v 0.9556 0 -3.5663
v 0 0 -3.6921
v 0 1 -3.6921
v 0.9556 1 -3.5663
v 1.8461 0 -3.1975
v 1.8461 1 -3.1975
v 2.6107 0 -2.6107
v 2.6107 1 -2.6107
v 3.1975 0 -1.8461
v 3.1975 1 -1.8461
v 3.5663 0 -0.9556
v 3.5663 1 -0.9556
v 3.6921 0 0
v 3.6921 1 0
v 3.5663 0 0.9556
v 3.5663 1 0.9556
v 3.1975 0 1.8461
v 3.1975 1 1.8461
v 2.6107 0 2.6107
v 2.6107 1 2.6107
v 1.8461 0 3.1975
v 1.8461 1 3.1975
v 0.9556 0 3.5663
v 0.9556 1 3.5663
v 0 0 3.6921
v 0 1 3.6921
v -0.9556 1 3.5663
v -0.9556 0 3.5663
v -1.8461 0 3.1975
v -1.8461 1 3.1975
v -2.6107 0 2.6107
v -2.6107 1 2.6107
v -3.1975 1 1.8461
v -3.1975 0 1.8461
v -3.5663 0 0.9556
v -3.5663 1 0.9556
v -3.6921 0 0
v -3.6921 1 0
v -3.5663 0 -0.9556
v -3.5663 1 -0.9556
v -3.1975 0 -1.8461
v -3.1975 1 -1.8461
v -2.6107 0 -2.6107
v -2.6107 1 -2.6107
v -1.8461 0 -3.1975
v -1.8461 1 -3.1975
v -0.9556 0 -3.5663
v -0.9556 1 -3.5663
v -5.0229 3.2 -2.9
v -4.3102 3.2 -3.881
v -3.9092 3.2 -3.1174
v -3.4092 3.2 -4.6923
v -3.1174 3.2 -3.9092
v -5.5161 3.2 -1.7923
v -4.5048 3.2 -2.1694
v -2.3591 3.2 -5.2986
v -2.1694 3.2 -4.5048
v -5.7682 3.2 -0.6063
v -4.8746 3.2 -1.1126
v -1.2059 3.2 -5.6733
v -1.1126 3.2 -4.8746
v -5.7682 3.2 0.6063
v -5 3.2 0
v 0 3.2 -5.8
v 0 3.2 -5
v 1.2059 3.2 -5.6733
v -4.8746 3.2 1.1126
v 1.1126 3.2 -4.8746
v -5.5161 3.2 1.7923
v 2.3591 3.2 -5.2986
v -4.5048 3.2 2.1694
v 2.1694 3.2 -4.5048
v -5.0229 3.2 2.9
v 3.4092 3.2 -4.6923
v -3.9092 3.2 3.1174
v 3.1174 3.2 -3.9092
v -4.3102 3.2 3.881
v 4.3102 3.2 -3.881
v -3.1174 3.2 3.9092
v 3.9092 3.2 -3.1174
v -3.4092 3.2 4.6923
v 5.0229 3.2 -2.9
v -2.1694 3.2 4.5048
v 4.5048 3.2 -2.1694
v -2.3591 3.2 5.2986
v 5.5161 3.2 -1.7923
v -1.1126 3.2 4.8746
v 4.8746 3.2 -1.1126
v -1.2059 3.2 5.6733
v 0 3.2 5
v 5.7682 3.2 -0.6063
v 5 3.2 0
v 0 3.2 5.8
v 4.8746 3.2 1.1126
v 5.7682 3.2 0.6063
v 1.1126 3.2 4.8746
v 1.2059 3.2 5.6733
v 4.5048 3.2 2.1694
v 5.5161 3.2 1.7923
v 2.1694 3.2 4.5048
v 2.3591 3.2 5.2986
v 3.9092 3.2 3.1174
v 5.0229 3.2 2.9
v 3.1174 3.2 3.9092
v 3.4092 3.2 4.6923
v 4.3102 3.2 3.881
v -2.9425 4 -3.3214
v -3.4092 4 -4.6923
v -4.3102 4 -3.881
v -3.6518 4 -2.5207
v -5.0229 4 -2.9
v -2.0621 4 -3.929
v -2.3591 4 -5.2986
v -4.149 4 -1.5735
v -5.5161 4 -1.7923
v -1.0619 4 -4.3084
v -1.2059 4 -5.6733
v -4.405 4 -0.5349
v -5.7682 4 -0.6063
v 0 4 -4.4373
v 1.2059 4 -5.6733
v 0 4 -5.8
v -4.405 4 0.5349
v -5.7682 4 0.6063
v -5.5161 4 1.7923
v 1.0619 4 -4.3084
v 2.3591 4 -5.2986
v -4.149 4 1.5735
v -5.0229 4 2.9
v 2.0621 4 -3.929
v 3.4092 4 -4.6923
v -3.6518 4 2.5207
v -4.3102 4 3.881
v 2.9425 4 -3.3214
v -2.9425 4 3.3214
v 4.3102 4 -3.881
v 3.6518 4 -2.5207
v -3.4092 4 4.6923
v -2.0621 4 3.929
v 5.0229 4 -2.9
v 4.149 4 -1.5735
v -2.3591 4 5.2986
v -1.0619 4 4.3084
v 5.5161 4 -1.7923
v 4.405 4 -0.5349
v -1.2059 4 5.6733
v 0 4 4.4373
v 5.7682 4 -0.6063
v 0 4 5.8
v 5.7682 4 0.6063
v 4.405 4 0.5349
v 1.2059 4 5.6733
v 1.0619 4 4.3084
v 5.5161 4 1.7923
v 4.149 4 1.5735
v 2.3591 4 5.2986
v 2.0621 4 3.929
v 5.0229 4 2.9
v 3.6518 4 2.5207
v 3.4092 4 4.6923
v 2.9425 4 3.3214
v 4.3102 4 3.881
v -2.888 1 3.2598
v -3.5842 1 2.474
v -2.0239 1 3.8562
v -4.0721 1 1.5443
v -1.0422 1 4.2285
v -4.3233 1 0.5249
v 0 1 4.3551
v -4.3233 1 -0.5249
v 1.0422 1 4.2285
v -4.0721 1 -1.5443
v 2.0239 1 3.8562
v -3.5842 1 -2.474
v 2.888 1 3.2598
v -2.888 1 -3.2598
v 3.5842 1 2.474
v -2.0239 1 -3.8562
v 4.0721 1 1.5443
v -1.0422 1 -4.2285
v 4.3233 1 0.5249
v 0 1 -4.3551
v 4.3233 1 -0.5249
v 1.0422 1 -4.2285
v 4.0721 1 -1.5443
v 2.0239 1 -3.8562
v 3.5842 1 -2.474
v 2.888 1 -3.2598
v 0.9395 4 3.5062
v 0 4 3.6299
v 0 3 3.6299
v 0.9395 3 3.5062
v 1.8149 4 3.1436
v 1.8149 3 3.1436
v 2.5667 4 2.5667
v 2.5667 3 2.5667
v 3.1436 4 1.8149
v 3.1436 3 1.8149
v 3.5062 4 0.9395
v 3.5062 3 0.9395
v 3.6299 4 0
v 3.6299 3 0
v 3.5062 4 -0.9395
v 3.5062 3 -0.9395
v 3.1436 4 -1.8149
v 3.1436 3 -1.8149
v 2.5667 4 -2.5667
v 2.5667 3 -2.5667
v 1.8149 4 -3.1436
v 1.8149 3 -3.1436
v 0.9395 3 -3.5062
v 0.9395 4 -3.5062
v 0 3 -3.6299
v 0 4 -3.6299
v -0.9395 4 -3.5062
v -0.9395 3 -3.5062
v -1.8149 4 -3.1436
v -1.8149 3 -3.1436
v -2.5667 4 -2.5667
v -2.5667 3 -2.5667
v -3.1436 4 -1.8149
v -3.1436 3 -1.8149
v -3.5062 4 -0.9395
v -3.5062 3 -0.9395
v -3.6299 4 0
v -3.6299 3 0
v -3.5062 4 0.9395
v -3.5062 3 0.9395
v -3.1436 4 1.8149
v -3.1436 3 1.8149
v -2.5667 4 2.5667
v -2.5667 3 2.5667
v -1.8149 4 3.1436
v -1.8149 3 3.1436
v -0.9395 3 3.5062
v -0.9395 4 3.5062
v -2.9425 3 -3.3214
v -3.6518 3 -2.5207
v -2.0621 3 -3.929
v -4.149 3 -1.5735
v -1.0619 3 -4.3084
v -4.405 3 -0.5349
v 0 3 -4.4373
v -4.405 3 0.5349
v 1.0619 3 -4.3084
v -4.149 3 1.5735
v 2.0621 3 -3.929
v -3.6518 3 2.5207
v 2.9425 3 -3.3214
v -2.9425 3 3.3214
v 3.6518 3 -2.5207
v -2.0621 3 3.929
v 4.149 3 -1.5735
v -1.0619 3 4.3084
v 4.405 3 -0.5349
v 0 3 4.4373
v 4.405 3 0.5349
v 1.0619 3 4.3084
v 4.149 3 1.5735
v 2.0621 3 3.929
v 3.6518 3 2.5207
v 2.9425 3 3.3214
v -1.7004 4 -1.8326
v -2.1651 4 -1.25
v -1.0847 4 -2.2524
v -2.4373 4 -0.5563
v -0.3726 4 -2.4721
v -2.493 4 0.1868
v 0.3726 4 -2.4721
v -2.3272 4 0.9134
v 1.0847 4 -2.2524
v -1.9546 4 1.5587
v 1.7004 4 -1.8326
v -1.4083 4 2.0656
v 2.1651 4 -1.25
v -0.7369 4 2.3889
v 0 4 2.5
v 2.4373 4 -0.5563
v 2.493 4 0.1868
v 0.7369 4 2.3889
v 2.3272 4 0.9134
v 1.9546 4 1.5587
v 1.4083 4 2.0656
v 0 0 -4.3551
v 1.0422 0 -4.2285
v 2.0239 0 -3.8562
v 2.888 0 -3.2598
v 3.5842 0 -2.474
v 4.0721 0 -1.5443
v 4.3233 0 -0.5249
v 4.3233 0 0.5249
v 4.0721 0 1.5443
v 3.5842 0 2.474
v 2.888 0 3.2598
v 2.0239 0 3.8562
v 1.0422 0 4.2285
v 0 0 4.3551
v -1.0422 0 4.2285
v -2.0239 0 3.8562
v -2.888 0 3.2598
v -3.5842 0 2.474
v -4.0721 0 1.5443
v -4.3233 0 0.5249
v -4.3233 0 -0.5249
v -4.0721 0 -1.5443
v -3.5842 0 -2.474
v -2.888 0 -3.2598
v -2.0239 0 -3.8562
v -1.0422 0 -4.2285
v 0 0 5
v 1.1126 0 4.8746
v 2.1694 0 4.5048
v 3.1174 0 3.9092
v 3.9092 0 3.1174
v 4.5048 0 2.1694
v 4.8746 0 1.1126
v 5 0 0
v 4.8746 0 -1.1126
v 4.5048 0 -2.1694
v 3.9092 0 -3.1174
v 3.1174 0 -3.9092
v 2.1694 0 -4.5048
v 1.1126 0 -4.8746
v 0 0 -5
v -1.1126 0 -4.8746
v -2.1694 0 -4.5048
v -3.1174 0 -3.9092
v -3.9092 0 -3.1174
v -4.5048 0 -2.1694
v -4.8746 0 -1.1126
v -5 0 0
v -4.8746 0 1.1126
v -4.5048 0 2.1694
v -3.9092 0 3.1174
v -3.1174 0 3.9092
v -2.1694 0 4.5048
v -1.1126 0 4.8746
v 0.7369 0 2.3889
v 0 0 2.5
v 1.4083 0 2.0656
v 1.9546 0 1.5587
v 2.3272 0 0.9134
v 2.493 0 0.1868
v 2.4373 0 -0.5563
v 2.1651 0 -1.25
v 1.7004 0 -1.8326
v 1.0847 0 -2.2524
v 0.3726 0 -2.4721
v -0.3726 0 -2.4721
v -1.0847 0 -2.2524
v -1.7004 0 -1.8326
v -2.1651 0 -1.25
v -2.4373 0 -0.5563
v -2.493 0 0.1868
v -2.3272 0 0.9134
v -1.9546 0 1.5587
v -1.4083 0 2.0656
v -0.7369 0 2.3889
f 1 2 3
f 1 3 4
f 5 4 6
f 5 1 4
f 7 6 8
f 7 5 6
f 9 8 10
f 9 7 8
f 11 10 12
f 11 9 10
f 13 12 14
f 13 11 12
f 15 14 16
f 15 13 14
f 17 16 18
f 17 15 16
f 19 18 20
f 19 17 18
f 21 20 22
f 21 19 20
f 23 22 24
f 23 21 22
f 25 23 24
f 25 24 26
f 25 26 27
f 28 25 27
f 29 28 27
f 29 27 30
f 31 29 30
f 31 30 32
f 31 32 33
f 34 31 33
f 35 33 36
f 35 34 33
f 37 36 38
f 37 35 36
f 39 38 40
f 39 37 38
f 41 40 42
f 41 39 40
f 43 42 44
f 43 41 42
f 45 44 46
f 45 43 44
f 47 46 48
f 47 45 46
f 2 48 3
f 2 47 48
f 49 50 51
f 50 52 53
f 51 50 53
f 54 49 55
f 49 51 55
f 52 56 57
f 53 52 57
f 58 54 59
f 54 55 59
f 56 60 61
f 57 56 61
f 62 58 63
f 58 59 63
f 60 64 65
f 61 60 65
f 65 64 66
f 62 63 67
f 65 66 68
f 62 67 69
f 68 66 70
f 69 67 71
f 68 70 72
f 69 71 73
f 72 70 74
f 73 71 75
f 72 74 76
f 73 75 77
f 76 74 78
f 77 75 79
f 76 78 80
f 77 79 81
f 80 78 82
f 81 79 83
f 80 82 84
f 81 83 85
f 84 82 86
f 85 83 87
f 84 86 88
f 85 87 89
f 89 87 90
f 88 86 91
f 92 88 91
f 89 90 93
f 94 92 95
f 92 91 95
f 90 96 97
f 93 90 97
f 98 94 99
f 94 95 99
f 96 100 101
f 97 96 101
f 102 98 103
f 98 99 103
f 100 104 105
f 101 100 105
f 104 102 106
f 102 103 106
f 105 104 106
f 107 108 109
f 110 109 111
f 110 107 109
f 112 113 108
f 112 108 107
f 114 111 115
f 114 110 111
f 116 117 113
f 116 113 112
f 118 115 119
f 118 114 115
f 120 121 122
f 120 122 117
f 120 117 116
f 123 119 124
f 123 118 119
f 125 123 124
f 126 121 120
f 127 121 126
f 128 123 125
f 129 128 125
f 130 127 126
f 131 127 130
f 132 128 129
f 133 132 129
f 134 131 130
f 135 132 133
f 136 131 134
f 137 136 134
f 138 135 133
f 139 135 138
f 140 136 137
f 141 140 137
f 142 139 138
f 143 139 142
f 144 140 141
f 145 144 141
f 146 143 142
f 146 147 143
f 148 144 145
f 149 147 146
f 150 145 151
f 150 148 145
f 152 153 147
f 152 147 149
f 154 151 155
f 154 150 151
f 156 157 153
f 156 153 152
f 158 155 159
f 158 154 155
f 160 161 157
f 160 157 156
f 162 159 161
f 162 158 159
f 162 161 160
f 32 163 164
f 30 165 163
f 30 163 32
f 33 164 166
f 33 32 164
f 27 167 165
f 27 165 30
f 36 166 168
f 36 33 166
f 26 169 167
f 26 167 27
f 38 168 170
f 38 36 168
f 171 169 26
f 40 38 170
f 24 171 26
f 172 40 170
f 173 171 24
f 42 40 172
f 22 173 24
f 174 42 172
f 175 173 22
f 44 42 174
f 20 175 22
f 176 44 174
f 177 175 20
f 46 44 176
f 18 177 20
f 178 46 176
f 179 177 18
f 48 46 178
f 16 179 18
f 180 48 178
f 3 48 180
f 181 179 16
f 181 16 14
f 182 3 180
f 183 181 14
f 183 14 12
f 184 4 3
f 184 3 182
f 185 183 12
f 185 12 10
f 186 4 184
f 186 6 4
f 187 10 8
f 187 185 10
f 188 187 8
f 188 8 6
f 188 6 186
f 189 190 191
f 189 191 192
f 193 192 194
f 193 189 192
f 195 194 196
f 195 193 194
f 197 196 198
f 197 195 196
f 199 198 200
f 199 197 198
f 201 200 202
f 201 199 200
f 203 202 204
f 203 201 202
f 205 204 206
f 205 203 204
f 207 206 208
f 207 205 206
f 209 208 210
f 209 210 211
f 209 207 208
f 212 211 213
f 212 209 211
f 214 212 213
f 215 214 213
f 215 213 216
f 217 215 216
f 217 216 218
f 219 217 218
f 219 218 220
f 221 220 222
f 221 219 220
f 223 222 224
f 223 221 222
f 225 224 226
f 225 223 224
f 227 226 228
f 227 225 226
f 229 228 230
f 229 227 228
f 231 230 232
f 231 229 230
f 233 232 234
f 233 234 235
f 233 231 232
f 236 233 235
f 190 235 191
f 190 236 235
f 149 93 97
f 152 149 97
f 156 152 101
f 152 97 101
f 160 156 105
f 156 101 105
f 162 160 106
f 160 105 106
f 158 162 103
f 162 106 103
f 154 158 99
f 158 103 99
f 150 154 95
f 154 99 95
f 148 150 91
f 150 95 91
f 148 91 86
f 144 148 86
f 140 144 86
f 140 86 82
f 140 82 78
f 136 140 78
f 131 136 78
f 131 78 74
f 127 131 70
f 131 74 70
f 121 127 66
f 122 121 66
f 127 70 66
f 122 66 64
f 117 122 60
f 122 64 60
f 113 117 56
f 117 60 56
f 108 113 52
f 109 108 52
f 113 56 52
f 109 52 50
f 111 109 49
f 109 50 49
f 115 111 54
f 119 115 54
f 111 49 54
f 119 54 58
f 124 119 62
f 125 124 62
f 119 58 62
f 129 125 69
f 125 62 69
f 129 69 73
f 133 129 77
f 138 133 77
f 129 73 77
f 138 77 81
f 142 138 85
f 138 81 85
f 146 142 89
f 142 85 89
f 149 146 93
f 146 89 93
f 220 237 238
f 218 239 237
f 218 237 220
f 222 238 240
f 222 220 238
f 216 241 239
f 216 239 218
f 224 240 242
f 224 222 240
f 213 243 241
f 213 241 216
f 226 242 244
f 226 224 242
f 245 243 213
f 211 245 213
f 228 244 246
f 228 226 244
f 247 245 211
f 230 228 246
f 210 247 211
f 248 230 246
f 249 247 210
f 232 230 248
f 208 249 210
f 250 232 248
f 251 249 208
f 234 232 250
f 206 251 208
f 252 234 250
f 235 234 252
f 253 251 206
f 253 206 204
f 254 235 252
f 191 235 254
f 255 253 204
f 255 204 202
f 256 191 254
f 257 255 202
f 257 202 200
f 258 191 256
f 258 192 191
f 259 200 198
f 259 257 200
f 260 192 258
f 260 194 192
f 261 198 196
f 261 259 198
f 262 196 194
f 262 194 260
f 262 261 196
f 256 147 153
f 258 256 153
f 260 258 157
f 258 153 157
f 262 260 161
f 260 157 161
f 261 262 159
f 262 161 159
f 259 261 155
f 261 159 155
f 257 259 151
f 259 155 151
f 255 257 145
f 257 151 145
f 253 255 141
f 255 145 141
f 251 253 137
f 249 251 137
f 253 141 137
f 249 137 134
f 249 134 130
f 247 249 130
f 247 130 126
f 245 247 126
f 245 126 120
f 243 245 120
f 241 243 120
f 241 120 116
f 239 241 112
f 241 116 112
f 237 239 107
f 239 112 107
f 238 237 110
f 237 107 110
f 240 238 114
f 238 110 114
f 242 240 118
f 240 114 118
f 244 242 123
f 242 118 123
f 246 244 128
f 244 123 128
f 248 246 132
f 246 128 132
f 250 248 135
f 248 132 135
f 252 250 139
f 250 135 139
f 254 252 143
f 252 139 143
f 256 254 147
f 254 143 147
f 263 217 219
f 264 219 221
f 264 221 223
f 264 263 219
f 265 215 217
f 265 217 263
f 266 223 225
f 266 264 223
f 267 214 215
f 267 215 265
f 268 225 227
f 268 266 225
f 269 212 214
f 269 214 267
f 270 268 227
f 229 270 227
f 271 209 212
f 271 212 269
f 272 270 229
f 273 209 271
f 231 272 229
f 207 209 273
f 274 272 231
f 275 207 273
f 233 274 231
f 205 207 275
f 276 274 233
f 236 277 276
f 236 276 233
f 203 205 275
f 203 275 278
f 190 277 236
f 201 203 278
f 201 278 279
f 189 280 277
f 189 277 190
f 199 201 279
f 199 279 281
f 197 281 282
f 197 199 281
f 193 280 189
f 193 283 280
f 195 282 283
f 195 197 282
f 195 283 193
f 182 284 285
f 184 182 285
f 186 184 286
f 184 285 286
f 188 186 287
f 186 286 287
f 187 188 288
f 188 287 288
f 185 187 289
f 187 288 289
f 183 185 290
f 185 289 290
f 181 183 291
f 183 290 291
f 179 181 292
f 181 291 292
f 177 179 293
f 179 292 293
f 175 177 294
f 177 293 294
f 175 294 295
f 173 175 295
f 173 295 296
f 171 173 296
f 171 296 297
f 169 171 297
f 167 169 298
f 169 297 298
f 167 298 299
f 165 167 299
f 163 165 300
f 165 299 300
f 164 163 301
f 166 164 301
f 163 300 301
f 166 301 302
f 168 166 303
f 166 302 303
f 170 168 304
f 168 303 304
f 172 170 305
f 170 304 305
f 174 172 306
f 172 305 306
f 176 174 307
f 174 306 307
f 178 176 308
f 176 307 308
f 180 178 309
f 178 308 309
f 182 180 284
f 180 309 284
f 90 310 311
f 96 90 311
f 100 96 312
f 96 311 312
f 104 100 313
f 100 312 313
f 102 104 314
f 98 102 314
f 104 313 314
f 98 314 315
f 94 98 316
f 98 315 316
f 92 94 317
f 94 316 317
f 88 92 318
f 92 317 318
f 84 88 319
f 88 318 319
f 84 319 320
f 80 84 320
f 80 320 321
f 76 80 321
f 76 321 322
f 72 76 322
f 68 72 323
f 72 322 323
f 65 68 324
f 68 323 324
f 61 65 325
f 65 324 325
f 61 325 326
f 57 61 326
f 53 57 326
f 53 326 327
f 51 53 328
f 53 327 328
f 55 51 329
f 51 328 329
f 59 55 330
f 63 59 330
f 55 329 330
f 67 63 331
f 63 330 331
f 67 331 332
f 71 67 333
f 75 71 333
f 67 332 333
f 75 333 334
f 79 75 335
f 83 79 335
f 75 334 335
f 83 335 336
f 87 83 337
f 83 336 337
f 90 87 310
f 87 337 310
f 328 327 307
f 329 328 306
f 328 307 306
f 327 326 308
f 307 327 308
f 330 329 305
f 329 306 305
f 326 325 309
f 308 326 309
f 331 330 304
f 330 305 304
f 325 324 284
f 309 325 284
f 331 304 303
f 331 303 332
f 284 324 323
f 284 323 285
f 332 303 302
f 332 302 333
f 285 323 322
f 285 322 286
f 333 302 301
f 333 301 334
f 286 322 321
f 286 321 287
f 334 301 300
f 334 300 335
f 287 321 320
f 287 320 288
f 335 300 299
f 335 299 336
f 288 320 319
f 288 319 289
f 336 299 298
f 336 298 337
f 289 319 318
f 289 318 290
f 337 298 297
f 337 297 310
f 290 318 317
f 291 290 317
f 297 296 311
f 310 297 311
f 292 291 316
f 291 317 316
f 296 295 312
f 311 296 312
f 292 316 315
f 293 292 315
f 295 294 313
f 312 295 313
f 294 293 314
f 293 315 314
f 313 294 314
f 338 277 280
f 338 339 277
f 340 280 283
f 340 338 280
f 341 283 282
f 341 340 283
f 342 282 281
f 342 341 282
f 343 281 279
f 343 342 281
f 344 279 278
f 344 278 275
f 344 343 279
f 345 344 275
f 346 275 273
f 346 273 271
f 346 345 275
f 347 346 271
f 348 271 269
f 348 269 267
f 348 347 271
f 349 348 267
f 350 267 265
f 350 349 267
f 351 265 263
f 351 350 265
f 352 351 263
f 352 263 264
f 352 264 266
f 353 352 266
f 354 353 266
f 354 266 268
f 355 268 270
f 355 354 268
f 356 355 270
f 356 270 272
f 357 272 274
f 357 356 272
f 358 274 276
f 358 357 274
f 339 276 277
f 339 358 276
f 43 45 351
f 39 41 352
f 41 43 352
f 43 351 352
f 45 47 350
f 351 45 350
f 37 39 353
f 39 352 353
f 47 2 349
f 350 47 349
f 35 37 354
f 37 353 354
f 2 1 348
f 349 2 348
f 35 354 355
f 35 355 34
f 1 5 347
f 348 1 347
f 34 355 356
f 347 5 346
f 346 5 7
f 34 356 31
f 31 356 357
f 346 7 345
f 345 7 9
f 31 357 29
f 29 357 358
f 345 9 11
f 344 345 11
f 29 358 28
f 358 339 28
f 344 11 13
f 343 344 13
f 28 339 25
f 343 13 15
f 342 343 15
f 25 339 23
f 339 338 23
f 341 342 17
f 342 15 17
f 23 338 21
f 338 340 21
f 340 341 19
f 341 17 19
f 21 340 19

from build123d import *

# Parameters (mm, degrees)
SKETCH1_R           = 5
SKETCH1_R_2         = 2.5
BOSS_EXTRUDE1_DEPTH = 3.2
SKETCH2_R           = 5.8
SKETCH2_R_2         = 2.5
BOSS_EXTRUDE2_DEPTH = 0.8
SKETCH3_R           = 4.35508582
SKETCH3_R_2         = 3.692114727
CUT_EXTRUDE1_DEPTH  = 1
SKETCH4_R           = 4.43730614
SKETCH4_R_2         = 3.629860823
CUT_EXTRUDE2_DEPTH  = 1


with BuildPart() as part:
    # Sketch1 → Boss-Extrude1 (new body)
    with BuildSketch(Plane(origin=(0, 0, 0), x_dir=(1, 0, 0), z_dir=(0, 1, 0))):
        with Locations(Location((0, 0, 0), (0, 0, 270))):
            Circle(SKETCH1_R)
        with Locations(Location((0, 0, 0), (0, 0, 270))):
            Circle(SKETCH1_R_2, mode=Mode.SUBTRACT)
    extrude(amount=BOSS_EXTRUDE1_DEPTH)

    # Sketch2 → Boss-Extrude2 (add)
    with BuildSketch(Plane(origin=(0, 3.2, 0), x_dir=(1, 0, 0), z_dir=(0, 1, 0))):
        with Locations(Location((0, 0, 0), (0, 0, 270))):
            Circle(SKETCH2_R)
        with Locations(Location((0, 0, 0), (0, 0, 270))):
            Circle(SKETCH2_R_2, mode=Mode.SUBTRACT)
    extrude(amount=BOSS_EXTRUDE2_DEPTH)

    # Sketch3 → Cut-Extrude1 (cut)
    with BuildSketch(Plane.XZ):
        with Locations(Location((0, 0, 0), (0, 0, 270))):
            Circle(SKETCH3_R)
        with Locations(Location((0, 0, 0), (0, 0, 270))):
            Circle(SKETCH3_R_2, mode=Mode.SUBTRACT)
    extrude(amount=-CUT_EXTRUDE1_DEPTH, mode=Mode.SUBTRACT)

    # Sketch4 → Cut-Extrude2 (cut)
    with BuildSketch(Plane(origin=(0, 4, 0), x_dir=(1, 0, 0), z_dir=(0, 1, 0))):
        with Locations(Location((0, 0, 0), (0, 0, 270))):
            Circle(SKETCH4_R)
        with Locations(Location((0, 0, 0), (0, 0, 270))):
            Circle(SKETCH4_R_2, mode=Mode.SUBTRACT)
    extrude(amount=-CUT_EXTRUDE2_DEPTH, mode=Mode.SUBTRACT)


solid = part.part
